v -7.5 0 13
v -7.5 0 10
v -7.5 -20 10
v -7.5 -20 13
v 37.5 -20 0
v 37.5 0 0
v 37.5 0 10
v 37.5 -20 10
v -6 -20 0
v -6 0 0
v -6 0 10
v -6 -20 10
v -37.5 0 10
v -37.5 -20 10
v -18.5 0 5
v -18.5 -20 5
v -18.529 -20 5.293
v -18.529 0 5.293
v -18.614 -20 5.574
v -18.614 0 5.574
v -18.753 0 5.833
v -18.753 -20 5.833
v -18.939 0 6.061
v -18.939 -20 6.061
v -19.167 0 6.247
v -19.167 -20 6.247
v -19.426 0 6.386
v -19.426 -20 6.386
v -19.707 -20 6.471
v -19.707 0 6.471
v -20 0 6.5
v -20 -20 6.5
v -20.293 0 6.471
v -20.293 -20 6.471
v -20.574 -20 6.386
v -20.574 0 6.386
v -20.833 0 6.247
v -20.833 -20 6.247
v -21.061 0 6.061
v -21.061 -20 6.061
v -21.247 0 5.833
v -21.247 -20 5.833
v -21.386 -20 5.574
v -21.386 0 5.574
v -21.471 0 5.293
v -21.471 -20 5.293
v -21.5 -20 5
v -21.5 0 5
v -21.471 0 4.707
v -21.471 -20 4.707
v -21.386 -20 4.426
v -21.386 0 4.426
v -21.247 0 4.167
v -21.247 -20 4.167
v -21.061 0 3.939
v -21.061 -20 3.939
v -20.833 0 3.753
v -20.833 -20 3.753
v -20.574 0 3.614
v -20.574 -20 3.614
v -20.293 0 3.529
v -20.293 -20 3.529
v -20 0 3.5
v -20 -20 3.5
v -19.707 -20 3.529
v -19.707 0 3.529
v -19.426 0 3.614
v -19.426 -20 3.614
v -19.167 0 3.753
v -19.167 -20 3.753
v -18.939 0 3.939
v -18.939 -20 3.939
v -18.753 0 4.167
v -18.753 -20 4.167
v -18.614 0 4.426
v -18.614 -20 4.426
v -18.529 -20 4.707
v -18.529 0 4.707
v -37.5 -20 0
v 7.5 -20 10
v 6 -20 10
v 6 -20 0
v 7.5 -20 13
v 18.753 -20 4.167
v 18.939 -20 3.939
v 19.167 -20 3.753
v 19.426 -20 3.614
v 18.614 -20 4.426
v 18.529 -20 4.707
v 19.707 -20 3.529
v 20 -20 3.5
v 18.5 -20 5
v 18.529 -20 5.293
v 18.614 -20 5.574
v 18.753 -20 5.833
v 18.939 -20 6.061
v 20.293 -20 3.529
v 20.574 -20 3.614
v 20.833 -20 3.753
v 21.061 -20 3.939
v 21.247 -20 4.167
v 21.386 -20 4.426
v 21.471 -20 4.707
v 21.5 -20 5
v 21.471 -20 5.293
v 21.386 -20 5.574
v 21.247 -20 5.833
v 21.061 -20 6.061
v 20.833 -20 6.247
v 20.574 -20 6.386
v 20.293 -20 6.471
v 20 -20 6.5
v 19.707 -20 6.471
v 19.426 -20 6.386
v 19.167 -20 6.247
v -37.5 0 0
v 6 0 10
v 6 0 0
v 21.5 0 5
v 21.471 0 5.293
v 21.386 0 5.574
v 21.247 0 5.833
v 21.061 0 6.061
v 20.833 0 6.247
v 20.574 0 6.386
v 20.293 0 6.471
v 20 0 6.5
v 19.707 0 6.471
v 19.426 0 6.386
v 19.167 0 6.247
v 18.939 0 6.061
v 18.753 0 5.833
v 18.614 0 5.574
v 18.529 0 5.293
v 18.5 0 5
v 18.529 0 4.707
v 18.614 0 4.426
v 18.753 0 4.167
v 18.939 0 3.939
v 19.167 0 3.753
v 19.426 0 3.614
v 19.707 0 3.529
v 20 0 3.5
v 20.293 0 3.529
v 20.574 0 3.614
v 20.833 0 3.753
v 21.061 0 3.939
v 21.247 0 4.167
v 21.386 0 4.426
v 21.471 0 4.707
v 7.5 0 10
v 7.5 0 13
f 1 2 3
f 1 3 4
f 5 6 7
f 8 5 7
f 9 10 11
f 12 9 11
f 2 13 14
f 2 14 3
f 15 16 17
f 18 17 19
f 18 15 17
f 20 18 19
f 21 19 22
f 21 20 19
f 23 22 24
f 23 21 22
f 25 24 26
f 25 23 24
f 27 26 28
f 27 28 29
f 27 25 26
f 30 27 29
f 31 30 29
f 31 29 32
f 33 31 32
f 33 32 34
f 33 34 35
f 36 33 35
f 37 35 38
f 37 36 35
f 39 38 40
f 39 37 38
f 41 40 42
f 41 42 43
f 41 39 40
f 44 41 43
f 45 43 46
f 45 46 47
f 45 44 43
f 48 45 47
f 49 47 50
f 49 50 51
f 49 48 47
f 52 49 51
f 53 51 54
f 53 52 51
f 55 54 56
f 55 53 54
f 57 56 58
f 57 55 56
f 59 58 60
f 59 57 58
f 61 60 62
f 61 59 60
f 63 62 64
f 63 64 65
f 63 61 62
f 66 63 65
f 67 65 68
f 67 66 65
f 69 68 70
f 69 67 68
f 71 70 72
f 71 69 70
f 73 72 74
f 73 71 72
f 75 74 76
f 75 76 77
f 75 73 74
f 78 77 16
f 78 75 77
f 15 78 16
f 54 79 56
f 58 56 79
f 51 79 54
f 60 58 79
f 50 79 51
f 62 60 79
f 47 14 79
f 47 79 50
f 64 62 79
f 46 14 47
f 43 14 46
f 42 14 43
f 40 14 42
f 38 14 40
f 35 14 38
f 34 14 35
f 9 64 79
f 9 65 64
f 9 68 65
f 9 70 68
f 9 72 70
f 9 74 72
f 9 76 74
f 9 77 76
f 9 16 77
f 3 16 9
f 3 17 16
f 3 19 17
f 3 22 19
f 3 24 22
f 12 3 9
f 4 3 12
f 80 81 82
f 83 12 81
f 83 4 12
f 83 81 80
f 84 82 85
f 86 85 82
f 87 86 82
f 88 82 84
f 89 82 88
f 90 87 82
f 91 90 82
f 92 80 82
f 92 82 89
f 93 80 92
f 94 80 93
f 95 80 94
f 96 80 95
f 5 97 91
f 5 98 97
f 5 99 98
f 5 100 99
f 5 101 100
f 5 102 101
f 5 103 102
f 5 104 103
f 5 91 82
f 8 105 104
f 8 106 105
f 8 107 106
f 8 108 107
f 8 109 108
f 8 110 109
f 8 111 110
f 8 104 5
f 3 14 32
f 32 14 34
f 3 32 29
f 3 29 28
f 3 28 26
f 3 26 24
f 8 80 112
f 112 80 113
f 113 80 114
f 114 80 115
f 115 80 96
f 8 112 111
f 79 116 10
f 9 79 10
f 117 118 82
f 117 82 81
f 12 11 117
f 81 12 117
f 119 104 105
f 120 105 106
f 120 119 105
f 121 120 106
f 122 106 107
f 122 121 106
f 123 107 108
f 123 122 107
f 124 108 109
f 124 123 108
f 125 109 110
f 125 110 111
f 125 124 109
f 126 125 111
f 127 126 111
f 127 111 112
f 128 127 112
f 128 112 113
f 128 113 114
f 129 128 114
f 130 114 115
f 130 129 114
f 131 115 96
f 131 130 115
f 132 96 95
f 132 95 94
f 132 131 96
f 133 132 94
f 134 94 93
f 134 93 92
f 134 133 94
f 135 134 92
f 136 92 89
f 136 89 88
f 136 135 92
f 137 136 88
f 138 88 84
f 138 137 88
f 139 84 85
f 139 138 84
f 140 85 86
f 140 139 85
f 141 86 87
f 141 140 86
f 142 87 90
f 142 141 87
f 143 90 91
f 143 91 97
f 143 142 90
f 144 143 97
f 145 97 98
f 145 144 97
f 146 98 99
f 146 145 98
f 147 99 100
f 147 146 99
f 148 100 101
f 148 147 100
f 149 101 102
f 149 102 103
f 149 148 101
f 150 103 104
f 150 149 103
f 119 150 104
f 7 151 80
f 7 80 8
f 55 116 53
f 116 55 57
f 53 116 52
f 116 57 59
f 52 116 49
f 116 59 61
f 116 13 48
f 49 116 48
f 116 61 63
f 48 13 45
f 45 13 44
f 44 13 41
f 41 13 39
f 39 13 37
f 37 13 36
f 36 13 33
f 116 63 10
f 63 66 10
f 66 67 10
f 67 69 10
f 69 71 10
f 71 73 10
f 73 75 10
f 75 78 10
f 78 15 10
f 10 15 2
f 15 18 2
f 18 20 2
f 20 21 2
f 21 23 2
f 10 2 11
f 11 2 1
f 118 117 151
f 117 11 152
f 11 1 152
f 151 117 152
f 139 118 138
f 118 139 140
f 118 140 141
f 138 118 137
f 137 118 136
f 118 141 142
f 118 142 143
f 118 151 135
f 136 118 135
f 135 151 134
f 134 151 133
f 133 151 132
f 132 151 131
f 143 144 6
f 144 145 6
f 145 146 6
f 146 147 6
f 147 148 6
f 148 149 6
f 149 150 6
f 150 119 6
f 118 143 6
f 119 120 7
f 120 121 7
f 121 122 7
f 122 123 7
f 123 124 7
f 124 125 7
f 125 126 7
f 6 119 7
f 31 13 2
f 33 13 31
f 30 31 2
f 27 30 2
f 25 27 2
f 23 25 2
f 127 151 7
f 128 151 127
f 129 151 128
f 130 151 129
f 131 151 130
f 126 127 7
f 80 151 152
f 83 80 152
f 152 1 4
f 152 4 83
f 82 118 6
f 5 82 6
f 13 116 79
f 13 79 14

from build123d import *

# Parameters (mm, degrees)
SKETCH003_R  = 1.5
PAD003_DEPTH = 20
SKETCH002_R  = 1.5
PAD002_DEPTH = 20
SKETCH001_W  = 12
SKETCH001_H  = 10
PAD001_DEPTH = 20
SKETCH_W     = 15
SKETCH_H     = 13
SKETCH_W_2   = 30
SKETCH_H_2   = 10
PAD_DEPTH    = 20


with BuildPart() as body003:
    # Sketch003 → Pad003 (new body)
    with BuildSketch(Plane.XZ):
        with Locations((20, 5)):
            Circle(SKETCH003_R)
    extrude(amount=PAD003_DEPTH)


with BuildPart() as body002:
    # Sketch002 → Pad002 (new body)
    with BuildSketch(Plane.XZ):
        with Locations((-20, 5)):
            Circle(SKETCH002_R)
    extrude(amount=PAD002_DEPTH)


with BuildPart() as body001:
    # Sketch001 → Pad001 (new body)
    with BuildSketch(Plane.XZ):
        with Locations((0, 5)):
            Rectangle(SKETCH001_W, SKETCH001_H)
    extrude(amount=PAD001_DEPTH)


with BuildPart() as cut002:
    # Sketch → Pad (new body)
    with BuildSketch(Plane.XZ):
        with Locations((0, 6.5)):
            Rectangle(SKETCH_W, SKETCH_H)
        with Locations((-22.5, 5)):
            Rectangle(SKETCH_W_2, SKETCH_H_2)
        with Locations((22.5, 5)):
            Rectangle(SKETCH_W_2, SKETCH_H_2)
    extrude(amount=PAD_DEPTH)

    # Cut: cut Body001
    add(body001.part, mode=Mode.SUBTRACT)

    # Cut001: cut Body002
    add(body002.part, mode=Mode.SUBTRACT)

    # Cut002: cut Body003
    add(body003.part, mode=Mode.SUBTRACT)


solid = cut002.part
